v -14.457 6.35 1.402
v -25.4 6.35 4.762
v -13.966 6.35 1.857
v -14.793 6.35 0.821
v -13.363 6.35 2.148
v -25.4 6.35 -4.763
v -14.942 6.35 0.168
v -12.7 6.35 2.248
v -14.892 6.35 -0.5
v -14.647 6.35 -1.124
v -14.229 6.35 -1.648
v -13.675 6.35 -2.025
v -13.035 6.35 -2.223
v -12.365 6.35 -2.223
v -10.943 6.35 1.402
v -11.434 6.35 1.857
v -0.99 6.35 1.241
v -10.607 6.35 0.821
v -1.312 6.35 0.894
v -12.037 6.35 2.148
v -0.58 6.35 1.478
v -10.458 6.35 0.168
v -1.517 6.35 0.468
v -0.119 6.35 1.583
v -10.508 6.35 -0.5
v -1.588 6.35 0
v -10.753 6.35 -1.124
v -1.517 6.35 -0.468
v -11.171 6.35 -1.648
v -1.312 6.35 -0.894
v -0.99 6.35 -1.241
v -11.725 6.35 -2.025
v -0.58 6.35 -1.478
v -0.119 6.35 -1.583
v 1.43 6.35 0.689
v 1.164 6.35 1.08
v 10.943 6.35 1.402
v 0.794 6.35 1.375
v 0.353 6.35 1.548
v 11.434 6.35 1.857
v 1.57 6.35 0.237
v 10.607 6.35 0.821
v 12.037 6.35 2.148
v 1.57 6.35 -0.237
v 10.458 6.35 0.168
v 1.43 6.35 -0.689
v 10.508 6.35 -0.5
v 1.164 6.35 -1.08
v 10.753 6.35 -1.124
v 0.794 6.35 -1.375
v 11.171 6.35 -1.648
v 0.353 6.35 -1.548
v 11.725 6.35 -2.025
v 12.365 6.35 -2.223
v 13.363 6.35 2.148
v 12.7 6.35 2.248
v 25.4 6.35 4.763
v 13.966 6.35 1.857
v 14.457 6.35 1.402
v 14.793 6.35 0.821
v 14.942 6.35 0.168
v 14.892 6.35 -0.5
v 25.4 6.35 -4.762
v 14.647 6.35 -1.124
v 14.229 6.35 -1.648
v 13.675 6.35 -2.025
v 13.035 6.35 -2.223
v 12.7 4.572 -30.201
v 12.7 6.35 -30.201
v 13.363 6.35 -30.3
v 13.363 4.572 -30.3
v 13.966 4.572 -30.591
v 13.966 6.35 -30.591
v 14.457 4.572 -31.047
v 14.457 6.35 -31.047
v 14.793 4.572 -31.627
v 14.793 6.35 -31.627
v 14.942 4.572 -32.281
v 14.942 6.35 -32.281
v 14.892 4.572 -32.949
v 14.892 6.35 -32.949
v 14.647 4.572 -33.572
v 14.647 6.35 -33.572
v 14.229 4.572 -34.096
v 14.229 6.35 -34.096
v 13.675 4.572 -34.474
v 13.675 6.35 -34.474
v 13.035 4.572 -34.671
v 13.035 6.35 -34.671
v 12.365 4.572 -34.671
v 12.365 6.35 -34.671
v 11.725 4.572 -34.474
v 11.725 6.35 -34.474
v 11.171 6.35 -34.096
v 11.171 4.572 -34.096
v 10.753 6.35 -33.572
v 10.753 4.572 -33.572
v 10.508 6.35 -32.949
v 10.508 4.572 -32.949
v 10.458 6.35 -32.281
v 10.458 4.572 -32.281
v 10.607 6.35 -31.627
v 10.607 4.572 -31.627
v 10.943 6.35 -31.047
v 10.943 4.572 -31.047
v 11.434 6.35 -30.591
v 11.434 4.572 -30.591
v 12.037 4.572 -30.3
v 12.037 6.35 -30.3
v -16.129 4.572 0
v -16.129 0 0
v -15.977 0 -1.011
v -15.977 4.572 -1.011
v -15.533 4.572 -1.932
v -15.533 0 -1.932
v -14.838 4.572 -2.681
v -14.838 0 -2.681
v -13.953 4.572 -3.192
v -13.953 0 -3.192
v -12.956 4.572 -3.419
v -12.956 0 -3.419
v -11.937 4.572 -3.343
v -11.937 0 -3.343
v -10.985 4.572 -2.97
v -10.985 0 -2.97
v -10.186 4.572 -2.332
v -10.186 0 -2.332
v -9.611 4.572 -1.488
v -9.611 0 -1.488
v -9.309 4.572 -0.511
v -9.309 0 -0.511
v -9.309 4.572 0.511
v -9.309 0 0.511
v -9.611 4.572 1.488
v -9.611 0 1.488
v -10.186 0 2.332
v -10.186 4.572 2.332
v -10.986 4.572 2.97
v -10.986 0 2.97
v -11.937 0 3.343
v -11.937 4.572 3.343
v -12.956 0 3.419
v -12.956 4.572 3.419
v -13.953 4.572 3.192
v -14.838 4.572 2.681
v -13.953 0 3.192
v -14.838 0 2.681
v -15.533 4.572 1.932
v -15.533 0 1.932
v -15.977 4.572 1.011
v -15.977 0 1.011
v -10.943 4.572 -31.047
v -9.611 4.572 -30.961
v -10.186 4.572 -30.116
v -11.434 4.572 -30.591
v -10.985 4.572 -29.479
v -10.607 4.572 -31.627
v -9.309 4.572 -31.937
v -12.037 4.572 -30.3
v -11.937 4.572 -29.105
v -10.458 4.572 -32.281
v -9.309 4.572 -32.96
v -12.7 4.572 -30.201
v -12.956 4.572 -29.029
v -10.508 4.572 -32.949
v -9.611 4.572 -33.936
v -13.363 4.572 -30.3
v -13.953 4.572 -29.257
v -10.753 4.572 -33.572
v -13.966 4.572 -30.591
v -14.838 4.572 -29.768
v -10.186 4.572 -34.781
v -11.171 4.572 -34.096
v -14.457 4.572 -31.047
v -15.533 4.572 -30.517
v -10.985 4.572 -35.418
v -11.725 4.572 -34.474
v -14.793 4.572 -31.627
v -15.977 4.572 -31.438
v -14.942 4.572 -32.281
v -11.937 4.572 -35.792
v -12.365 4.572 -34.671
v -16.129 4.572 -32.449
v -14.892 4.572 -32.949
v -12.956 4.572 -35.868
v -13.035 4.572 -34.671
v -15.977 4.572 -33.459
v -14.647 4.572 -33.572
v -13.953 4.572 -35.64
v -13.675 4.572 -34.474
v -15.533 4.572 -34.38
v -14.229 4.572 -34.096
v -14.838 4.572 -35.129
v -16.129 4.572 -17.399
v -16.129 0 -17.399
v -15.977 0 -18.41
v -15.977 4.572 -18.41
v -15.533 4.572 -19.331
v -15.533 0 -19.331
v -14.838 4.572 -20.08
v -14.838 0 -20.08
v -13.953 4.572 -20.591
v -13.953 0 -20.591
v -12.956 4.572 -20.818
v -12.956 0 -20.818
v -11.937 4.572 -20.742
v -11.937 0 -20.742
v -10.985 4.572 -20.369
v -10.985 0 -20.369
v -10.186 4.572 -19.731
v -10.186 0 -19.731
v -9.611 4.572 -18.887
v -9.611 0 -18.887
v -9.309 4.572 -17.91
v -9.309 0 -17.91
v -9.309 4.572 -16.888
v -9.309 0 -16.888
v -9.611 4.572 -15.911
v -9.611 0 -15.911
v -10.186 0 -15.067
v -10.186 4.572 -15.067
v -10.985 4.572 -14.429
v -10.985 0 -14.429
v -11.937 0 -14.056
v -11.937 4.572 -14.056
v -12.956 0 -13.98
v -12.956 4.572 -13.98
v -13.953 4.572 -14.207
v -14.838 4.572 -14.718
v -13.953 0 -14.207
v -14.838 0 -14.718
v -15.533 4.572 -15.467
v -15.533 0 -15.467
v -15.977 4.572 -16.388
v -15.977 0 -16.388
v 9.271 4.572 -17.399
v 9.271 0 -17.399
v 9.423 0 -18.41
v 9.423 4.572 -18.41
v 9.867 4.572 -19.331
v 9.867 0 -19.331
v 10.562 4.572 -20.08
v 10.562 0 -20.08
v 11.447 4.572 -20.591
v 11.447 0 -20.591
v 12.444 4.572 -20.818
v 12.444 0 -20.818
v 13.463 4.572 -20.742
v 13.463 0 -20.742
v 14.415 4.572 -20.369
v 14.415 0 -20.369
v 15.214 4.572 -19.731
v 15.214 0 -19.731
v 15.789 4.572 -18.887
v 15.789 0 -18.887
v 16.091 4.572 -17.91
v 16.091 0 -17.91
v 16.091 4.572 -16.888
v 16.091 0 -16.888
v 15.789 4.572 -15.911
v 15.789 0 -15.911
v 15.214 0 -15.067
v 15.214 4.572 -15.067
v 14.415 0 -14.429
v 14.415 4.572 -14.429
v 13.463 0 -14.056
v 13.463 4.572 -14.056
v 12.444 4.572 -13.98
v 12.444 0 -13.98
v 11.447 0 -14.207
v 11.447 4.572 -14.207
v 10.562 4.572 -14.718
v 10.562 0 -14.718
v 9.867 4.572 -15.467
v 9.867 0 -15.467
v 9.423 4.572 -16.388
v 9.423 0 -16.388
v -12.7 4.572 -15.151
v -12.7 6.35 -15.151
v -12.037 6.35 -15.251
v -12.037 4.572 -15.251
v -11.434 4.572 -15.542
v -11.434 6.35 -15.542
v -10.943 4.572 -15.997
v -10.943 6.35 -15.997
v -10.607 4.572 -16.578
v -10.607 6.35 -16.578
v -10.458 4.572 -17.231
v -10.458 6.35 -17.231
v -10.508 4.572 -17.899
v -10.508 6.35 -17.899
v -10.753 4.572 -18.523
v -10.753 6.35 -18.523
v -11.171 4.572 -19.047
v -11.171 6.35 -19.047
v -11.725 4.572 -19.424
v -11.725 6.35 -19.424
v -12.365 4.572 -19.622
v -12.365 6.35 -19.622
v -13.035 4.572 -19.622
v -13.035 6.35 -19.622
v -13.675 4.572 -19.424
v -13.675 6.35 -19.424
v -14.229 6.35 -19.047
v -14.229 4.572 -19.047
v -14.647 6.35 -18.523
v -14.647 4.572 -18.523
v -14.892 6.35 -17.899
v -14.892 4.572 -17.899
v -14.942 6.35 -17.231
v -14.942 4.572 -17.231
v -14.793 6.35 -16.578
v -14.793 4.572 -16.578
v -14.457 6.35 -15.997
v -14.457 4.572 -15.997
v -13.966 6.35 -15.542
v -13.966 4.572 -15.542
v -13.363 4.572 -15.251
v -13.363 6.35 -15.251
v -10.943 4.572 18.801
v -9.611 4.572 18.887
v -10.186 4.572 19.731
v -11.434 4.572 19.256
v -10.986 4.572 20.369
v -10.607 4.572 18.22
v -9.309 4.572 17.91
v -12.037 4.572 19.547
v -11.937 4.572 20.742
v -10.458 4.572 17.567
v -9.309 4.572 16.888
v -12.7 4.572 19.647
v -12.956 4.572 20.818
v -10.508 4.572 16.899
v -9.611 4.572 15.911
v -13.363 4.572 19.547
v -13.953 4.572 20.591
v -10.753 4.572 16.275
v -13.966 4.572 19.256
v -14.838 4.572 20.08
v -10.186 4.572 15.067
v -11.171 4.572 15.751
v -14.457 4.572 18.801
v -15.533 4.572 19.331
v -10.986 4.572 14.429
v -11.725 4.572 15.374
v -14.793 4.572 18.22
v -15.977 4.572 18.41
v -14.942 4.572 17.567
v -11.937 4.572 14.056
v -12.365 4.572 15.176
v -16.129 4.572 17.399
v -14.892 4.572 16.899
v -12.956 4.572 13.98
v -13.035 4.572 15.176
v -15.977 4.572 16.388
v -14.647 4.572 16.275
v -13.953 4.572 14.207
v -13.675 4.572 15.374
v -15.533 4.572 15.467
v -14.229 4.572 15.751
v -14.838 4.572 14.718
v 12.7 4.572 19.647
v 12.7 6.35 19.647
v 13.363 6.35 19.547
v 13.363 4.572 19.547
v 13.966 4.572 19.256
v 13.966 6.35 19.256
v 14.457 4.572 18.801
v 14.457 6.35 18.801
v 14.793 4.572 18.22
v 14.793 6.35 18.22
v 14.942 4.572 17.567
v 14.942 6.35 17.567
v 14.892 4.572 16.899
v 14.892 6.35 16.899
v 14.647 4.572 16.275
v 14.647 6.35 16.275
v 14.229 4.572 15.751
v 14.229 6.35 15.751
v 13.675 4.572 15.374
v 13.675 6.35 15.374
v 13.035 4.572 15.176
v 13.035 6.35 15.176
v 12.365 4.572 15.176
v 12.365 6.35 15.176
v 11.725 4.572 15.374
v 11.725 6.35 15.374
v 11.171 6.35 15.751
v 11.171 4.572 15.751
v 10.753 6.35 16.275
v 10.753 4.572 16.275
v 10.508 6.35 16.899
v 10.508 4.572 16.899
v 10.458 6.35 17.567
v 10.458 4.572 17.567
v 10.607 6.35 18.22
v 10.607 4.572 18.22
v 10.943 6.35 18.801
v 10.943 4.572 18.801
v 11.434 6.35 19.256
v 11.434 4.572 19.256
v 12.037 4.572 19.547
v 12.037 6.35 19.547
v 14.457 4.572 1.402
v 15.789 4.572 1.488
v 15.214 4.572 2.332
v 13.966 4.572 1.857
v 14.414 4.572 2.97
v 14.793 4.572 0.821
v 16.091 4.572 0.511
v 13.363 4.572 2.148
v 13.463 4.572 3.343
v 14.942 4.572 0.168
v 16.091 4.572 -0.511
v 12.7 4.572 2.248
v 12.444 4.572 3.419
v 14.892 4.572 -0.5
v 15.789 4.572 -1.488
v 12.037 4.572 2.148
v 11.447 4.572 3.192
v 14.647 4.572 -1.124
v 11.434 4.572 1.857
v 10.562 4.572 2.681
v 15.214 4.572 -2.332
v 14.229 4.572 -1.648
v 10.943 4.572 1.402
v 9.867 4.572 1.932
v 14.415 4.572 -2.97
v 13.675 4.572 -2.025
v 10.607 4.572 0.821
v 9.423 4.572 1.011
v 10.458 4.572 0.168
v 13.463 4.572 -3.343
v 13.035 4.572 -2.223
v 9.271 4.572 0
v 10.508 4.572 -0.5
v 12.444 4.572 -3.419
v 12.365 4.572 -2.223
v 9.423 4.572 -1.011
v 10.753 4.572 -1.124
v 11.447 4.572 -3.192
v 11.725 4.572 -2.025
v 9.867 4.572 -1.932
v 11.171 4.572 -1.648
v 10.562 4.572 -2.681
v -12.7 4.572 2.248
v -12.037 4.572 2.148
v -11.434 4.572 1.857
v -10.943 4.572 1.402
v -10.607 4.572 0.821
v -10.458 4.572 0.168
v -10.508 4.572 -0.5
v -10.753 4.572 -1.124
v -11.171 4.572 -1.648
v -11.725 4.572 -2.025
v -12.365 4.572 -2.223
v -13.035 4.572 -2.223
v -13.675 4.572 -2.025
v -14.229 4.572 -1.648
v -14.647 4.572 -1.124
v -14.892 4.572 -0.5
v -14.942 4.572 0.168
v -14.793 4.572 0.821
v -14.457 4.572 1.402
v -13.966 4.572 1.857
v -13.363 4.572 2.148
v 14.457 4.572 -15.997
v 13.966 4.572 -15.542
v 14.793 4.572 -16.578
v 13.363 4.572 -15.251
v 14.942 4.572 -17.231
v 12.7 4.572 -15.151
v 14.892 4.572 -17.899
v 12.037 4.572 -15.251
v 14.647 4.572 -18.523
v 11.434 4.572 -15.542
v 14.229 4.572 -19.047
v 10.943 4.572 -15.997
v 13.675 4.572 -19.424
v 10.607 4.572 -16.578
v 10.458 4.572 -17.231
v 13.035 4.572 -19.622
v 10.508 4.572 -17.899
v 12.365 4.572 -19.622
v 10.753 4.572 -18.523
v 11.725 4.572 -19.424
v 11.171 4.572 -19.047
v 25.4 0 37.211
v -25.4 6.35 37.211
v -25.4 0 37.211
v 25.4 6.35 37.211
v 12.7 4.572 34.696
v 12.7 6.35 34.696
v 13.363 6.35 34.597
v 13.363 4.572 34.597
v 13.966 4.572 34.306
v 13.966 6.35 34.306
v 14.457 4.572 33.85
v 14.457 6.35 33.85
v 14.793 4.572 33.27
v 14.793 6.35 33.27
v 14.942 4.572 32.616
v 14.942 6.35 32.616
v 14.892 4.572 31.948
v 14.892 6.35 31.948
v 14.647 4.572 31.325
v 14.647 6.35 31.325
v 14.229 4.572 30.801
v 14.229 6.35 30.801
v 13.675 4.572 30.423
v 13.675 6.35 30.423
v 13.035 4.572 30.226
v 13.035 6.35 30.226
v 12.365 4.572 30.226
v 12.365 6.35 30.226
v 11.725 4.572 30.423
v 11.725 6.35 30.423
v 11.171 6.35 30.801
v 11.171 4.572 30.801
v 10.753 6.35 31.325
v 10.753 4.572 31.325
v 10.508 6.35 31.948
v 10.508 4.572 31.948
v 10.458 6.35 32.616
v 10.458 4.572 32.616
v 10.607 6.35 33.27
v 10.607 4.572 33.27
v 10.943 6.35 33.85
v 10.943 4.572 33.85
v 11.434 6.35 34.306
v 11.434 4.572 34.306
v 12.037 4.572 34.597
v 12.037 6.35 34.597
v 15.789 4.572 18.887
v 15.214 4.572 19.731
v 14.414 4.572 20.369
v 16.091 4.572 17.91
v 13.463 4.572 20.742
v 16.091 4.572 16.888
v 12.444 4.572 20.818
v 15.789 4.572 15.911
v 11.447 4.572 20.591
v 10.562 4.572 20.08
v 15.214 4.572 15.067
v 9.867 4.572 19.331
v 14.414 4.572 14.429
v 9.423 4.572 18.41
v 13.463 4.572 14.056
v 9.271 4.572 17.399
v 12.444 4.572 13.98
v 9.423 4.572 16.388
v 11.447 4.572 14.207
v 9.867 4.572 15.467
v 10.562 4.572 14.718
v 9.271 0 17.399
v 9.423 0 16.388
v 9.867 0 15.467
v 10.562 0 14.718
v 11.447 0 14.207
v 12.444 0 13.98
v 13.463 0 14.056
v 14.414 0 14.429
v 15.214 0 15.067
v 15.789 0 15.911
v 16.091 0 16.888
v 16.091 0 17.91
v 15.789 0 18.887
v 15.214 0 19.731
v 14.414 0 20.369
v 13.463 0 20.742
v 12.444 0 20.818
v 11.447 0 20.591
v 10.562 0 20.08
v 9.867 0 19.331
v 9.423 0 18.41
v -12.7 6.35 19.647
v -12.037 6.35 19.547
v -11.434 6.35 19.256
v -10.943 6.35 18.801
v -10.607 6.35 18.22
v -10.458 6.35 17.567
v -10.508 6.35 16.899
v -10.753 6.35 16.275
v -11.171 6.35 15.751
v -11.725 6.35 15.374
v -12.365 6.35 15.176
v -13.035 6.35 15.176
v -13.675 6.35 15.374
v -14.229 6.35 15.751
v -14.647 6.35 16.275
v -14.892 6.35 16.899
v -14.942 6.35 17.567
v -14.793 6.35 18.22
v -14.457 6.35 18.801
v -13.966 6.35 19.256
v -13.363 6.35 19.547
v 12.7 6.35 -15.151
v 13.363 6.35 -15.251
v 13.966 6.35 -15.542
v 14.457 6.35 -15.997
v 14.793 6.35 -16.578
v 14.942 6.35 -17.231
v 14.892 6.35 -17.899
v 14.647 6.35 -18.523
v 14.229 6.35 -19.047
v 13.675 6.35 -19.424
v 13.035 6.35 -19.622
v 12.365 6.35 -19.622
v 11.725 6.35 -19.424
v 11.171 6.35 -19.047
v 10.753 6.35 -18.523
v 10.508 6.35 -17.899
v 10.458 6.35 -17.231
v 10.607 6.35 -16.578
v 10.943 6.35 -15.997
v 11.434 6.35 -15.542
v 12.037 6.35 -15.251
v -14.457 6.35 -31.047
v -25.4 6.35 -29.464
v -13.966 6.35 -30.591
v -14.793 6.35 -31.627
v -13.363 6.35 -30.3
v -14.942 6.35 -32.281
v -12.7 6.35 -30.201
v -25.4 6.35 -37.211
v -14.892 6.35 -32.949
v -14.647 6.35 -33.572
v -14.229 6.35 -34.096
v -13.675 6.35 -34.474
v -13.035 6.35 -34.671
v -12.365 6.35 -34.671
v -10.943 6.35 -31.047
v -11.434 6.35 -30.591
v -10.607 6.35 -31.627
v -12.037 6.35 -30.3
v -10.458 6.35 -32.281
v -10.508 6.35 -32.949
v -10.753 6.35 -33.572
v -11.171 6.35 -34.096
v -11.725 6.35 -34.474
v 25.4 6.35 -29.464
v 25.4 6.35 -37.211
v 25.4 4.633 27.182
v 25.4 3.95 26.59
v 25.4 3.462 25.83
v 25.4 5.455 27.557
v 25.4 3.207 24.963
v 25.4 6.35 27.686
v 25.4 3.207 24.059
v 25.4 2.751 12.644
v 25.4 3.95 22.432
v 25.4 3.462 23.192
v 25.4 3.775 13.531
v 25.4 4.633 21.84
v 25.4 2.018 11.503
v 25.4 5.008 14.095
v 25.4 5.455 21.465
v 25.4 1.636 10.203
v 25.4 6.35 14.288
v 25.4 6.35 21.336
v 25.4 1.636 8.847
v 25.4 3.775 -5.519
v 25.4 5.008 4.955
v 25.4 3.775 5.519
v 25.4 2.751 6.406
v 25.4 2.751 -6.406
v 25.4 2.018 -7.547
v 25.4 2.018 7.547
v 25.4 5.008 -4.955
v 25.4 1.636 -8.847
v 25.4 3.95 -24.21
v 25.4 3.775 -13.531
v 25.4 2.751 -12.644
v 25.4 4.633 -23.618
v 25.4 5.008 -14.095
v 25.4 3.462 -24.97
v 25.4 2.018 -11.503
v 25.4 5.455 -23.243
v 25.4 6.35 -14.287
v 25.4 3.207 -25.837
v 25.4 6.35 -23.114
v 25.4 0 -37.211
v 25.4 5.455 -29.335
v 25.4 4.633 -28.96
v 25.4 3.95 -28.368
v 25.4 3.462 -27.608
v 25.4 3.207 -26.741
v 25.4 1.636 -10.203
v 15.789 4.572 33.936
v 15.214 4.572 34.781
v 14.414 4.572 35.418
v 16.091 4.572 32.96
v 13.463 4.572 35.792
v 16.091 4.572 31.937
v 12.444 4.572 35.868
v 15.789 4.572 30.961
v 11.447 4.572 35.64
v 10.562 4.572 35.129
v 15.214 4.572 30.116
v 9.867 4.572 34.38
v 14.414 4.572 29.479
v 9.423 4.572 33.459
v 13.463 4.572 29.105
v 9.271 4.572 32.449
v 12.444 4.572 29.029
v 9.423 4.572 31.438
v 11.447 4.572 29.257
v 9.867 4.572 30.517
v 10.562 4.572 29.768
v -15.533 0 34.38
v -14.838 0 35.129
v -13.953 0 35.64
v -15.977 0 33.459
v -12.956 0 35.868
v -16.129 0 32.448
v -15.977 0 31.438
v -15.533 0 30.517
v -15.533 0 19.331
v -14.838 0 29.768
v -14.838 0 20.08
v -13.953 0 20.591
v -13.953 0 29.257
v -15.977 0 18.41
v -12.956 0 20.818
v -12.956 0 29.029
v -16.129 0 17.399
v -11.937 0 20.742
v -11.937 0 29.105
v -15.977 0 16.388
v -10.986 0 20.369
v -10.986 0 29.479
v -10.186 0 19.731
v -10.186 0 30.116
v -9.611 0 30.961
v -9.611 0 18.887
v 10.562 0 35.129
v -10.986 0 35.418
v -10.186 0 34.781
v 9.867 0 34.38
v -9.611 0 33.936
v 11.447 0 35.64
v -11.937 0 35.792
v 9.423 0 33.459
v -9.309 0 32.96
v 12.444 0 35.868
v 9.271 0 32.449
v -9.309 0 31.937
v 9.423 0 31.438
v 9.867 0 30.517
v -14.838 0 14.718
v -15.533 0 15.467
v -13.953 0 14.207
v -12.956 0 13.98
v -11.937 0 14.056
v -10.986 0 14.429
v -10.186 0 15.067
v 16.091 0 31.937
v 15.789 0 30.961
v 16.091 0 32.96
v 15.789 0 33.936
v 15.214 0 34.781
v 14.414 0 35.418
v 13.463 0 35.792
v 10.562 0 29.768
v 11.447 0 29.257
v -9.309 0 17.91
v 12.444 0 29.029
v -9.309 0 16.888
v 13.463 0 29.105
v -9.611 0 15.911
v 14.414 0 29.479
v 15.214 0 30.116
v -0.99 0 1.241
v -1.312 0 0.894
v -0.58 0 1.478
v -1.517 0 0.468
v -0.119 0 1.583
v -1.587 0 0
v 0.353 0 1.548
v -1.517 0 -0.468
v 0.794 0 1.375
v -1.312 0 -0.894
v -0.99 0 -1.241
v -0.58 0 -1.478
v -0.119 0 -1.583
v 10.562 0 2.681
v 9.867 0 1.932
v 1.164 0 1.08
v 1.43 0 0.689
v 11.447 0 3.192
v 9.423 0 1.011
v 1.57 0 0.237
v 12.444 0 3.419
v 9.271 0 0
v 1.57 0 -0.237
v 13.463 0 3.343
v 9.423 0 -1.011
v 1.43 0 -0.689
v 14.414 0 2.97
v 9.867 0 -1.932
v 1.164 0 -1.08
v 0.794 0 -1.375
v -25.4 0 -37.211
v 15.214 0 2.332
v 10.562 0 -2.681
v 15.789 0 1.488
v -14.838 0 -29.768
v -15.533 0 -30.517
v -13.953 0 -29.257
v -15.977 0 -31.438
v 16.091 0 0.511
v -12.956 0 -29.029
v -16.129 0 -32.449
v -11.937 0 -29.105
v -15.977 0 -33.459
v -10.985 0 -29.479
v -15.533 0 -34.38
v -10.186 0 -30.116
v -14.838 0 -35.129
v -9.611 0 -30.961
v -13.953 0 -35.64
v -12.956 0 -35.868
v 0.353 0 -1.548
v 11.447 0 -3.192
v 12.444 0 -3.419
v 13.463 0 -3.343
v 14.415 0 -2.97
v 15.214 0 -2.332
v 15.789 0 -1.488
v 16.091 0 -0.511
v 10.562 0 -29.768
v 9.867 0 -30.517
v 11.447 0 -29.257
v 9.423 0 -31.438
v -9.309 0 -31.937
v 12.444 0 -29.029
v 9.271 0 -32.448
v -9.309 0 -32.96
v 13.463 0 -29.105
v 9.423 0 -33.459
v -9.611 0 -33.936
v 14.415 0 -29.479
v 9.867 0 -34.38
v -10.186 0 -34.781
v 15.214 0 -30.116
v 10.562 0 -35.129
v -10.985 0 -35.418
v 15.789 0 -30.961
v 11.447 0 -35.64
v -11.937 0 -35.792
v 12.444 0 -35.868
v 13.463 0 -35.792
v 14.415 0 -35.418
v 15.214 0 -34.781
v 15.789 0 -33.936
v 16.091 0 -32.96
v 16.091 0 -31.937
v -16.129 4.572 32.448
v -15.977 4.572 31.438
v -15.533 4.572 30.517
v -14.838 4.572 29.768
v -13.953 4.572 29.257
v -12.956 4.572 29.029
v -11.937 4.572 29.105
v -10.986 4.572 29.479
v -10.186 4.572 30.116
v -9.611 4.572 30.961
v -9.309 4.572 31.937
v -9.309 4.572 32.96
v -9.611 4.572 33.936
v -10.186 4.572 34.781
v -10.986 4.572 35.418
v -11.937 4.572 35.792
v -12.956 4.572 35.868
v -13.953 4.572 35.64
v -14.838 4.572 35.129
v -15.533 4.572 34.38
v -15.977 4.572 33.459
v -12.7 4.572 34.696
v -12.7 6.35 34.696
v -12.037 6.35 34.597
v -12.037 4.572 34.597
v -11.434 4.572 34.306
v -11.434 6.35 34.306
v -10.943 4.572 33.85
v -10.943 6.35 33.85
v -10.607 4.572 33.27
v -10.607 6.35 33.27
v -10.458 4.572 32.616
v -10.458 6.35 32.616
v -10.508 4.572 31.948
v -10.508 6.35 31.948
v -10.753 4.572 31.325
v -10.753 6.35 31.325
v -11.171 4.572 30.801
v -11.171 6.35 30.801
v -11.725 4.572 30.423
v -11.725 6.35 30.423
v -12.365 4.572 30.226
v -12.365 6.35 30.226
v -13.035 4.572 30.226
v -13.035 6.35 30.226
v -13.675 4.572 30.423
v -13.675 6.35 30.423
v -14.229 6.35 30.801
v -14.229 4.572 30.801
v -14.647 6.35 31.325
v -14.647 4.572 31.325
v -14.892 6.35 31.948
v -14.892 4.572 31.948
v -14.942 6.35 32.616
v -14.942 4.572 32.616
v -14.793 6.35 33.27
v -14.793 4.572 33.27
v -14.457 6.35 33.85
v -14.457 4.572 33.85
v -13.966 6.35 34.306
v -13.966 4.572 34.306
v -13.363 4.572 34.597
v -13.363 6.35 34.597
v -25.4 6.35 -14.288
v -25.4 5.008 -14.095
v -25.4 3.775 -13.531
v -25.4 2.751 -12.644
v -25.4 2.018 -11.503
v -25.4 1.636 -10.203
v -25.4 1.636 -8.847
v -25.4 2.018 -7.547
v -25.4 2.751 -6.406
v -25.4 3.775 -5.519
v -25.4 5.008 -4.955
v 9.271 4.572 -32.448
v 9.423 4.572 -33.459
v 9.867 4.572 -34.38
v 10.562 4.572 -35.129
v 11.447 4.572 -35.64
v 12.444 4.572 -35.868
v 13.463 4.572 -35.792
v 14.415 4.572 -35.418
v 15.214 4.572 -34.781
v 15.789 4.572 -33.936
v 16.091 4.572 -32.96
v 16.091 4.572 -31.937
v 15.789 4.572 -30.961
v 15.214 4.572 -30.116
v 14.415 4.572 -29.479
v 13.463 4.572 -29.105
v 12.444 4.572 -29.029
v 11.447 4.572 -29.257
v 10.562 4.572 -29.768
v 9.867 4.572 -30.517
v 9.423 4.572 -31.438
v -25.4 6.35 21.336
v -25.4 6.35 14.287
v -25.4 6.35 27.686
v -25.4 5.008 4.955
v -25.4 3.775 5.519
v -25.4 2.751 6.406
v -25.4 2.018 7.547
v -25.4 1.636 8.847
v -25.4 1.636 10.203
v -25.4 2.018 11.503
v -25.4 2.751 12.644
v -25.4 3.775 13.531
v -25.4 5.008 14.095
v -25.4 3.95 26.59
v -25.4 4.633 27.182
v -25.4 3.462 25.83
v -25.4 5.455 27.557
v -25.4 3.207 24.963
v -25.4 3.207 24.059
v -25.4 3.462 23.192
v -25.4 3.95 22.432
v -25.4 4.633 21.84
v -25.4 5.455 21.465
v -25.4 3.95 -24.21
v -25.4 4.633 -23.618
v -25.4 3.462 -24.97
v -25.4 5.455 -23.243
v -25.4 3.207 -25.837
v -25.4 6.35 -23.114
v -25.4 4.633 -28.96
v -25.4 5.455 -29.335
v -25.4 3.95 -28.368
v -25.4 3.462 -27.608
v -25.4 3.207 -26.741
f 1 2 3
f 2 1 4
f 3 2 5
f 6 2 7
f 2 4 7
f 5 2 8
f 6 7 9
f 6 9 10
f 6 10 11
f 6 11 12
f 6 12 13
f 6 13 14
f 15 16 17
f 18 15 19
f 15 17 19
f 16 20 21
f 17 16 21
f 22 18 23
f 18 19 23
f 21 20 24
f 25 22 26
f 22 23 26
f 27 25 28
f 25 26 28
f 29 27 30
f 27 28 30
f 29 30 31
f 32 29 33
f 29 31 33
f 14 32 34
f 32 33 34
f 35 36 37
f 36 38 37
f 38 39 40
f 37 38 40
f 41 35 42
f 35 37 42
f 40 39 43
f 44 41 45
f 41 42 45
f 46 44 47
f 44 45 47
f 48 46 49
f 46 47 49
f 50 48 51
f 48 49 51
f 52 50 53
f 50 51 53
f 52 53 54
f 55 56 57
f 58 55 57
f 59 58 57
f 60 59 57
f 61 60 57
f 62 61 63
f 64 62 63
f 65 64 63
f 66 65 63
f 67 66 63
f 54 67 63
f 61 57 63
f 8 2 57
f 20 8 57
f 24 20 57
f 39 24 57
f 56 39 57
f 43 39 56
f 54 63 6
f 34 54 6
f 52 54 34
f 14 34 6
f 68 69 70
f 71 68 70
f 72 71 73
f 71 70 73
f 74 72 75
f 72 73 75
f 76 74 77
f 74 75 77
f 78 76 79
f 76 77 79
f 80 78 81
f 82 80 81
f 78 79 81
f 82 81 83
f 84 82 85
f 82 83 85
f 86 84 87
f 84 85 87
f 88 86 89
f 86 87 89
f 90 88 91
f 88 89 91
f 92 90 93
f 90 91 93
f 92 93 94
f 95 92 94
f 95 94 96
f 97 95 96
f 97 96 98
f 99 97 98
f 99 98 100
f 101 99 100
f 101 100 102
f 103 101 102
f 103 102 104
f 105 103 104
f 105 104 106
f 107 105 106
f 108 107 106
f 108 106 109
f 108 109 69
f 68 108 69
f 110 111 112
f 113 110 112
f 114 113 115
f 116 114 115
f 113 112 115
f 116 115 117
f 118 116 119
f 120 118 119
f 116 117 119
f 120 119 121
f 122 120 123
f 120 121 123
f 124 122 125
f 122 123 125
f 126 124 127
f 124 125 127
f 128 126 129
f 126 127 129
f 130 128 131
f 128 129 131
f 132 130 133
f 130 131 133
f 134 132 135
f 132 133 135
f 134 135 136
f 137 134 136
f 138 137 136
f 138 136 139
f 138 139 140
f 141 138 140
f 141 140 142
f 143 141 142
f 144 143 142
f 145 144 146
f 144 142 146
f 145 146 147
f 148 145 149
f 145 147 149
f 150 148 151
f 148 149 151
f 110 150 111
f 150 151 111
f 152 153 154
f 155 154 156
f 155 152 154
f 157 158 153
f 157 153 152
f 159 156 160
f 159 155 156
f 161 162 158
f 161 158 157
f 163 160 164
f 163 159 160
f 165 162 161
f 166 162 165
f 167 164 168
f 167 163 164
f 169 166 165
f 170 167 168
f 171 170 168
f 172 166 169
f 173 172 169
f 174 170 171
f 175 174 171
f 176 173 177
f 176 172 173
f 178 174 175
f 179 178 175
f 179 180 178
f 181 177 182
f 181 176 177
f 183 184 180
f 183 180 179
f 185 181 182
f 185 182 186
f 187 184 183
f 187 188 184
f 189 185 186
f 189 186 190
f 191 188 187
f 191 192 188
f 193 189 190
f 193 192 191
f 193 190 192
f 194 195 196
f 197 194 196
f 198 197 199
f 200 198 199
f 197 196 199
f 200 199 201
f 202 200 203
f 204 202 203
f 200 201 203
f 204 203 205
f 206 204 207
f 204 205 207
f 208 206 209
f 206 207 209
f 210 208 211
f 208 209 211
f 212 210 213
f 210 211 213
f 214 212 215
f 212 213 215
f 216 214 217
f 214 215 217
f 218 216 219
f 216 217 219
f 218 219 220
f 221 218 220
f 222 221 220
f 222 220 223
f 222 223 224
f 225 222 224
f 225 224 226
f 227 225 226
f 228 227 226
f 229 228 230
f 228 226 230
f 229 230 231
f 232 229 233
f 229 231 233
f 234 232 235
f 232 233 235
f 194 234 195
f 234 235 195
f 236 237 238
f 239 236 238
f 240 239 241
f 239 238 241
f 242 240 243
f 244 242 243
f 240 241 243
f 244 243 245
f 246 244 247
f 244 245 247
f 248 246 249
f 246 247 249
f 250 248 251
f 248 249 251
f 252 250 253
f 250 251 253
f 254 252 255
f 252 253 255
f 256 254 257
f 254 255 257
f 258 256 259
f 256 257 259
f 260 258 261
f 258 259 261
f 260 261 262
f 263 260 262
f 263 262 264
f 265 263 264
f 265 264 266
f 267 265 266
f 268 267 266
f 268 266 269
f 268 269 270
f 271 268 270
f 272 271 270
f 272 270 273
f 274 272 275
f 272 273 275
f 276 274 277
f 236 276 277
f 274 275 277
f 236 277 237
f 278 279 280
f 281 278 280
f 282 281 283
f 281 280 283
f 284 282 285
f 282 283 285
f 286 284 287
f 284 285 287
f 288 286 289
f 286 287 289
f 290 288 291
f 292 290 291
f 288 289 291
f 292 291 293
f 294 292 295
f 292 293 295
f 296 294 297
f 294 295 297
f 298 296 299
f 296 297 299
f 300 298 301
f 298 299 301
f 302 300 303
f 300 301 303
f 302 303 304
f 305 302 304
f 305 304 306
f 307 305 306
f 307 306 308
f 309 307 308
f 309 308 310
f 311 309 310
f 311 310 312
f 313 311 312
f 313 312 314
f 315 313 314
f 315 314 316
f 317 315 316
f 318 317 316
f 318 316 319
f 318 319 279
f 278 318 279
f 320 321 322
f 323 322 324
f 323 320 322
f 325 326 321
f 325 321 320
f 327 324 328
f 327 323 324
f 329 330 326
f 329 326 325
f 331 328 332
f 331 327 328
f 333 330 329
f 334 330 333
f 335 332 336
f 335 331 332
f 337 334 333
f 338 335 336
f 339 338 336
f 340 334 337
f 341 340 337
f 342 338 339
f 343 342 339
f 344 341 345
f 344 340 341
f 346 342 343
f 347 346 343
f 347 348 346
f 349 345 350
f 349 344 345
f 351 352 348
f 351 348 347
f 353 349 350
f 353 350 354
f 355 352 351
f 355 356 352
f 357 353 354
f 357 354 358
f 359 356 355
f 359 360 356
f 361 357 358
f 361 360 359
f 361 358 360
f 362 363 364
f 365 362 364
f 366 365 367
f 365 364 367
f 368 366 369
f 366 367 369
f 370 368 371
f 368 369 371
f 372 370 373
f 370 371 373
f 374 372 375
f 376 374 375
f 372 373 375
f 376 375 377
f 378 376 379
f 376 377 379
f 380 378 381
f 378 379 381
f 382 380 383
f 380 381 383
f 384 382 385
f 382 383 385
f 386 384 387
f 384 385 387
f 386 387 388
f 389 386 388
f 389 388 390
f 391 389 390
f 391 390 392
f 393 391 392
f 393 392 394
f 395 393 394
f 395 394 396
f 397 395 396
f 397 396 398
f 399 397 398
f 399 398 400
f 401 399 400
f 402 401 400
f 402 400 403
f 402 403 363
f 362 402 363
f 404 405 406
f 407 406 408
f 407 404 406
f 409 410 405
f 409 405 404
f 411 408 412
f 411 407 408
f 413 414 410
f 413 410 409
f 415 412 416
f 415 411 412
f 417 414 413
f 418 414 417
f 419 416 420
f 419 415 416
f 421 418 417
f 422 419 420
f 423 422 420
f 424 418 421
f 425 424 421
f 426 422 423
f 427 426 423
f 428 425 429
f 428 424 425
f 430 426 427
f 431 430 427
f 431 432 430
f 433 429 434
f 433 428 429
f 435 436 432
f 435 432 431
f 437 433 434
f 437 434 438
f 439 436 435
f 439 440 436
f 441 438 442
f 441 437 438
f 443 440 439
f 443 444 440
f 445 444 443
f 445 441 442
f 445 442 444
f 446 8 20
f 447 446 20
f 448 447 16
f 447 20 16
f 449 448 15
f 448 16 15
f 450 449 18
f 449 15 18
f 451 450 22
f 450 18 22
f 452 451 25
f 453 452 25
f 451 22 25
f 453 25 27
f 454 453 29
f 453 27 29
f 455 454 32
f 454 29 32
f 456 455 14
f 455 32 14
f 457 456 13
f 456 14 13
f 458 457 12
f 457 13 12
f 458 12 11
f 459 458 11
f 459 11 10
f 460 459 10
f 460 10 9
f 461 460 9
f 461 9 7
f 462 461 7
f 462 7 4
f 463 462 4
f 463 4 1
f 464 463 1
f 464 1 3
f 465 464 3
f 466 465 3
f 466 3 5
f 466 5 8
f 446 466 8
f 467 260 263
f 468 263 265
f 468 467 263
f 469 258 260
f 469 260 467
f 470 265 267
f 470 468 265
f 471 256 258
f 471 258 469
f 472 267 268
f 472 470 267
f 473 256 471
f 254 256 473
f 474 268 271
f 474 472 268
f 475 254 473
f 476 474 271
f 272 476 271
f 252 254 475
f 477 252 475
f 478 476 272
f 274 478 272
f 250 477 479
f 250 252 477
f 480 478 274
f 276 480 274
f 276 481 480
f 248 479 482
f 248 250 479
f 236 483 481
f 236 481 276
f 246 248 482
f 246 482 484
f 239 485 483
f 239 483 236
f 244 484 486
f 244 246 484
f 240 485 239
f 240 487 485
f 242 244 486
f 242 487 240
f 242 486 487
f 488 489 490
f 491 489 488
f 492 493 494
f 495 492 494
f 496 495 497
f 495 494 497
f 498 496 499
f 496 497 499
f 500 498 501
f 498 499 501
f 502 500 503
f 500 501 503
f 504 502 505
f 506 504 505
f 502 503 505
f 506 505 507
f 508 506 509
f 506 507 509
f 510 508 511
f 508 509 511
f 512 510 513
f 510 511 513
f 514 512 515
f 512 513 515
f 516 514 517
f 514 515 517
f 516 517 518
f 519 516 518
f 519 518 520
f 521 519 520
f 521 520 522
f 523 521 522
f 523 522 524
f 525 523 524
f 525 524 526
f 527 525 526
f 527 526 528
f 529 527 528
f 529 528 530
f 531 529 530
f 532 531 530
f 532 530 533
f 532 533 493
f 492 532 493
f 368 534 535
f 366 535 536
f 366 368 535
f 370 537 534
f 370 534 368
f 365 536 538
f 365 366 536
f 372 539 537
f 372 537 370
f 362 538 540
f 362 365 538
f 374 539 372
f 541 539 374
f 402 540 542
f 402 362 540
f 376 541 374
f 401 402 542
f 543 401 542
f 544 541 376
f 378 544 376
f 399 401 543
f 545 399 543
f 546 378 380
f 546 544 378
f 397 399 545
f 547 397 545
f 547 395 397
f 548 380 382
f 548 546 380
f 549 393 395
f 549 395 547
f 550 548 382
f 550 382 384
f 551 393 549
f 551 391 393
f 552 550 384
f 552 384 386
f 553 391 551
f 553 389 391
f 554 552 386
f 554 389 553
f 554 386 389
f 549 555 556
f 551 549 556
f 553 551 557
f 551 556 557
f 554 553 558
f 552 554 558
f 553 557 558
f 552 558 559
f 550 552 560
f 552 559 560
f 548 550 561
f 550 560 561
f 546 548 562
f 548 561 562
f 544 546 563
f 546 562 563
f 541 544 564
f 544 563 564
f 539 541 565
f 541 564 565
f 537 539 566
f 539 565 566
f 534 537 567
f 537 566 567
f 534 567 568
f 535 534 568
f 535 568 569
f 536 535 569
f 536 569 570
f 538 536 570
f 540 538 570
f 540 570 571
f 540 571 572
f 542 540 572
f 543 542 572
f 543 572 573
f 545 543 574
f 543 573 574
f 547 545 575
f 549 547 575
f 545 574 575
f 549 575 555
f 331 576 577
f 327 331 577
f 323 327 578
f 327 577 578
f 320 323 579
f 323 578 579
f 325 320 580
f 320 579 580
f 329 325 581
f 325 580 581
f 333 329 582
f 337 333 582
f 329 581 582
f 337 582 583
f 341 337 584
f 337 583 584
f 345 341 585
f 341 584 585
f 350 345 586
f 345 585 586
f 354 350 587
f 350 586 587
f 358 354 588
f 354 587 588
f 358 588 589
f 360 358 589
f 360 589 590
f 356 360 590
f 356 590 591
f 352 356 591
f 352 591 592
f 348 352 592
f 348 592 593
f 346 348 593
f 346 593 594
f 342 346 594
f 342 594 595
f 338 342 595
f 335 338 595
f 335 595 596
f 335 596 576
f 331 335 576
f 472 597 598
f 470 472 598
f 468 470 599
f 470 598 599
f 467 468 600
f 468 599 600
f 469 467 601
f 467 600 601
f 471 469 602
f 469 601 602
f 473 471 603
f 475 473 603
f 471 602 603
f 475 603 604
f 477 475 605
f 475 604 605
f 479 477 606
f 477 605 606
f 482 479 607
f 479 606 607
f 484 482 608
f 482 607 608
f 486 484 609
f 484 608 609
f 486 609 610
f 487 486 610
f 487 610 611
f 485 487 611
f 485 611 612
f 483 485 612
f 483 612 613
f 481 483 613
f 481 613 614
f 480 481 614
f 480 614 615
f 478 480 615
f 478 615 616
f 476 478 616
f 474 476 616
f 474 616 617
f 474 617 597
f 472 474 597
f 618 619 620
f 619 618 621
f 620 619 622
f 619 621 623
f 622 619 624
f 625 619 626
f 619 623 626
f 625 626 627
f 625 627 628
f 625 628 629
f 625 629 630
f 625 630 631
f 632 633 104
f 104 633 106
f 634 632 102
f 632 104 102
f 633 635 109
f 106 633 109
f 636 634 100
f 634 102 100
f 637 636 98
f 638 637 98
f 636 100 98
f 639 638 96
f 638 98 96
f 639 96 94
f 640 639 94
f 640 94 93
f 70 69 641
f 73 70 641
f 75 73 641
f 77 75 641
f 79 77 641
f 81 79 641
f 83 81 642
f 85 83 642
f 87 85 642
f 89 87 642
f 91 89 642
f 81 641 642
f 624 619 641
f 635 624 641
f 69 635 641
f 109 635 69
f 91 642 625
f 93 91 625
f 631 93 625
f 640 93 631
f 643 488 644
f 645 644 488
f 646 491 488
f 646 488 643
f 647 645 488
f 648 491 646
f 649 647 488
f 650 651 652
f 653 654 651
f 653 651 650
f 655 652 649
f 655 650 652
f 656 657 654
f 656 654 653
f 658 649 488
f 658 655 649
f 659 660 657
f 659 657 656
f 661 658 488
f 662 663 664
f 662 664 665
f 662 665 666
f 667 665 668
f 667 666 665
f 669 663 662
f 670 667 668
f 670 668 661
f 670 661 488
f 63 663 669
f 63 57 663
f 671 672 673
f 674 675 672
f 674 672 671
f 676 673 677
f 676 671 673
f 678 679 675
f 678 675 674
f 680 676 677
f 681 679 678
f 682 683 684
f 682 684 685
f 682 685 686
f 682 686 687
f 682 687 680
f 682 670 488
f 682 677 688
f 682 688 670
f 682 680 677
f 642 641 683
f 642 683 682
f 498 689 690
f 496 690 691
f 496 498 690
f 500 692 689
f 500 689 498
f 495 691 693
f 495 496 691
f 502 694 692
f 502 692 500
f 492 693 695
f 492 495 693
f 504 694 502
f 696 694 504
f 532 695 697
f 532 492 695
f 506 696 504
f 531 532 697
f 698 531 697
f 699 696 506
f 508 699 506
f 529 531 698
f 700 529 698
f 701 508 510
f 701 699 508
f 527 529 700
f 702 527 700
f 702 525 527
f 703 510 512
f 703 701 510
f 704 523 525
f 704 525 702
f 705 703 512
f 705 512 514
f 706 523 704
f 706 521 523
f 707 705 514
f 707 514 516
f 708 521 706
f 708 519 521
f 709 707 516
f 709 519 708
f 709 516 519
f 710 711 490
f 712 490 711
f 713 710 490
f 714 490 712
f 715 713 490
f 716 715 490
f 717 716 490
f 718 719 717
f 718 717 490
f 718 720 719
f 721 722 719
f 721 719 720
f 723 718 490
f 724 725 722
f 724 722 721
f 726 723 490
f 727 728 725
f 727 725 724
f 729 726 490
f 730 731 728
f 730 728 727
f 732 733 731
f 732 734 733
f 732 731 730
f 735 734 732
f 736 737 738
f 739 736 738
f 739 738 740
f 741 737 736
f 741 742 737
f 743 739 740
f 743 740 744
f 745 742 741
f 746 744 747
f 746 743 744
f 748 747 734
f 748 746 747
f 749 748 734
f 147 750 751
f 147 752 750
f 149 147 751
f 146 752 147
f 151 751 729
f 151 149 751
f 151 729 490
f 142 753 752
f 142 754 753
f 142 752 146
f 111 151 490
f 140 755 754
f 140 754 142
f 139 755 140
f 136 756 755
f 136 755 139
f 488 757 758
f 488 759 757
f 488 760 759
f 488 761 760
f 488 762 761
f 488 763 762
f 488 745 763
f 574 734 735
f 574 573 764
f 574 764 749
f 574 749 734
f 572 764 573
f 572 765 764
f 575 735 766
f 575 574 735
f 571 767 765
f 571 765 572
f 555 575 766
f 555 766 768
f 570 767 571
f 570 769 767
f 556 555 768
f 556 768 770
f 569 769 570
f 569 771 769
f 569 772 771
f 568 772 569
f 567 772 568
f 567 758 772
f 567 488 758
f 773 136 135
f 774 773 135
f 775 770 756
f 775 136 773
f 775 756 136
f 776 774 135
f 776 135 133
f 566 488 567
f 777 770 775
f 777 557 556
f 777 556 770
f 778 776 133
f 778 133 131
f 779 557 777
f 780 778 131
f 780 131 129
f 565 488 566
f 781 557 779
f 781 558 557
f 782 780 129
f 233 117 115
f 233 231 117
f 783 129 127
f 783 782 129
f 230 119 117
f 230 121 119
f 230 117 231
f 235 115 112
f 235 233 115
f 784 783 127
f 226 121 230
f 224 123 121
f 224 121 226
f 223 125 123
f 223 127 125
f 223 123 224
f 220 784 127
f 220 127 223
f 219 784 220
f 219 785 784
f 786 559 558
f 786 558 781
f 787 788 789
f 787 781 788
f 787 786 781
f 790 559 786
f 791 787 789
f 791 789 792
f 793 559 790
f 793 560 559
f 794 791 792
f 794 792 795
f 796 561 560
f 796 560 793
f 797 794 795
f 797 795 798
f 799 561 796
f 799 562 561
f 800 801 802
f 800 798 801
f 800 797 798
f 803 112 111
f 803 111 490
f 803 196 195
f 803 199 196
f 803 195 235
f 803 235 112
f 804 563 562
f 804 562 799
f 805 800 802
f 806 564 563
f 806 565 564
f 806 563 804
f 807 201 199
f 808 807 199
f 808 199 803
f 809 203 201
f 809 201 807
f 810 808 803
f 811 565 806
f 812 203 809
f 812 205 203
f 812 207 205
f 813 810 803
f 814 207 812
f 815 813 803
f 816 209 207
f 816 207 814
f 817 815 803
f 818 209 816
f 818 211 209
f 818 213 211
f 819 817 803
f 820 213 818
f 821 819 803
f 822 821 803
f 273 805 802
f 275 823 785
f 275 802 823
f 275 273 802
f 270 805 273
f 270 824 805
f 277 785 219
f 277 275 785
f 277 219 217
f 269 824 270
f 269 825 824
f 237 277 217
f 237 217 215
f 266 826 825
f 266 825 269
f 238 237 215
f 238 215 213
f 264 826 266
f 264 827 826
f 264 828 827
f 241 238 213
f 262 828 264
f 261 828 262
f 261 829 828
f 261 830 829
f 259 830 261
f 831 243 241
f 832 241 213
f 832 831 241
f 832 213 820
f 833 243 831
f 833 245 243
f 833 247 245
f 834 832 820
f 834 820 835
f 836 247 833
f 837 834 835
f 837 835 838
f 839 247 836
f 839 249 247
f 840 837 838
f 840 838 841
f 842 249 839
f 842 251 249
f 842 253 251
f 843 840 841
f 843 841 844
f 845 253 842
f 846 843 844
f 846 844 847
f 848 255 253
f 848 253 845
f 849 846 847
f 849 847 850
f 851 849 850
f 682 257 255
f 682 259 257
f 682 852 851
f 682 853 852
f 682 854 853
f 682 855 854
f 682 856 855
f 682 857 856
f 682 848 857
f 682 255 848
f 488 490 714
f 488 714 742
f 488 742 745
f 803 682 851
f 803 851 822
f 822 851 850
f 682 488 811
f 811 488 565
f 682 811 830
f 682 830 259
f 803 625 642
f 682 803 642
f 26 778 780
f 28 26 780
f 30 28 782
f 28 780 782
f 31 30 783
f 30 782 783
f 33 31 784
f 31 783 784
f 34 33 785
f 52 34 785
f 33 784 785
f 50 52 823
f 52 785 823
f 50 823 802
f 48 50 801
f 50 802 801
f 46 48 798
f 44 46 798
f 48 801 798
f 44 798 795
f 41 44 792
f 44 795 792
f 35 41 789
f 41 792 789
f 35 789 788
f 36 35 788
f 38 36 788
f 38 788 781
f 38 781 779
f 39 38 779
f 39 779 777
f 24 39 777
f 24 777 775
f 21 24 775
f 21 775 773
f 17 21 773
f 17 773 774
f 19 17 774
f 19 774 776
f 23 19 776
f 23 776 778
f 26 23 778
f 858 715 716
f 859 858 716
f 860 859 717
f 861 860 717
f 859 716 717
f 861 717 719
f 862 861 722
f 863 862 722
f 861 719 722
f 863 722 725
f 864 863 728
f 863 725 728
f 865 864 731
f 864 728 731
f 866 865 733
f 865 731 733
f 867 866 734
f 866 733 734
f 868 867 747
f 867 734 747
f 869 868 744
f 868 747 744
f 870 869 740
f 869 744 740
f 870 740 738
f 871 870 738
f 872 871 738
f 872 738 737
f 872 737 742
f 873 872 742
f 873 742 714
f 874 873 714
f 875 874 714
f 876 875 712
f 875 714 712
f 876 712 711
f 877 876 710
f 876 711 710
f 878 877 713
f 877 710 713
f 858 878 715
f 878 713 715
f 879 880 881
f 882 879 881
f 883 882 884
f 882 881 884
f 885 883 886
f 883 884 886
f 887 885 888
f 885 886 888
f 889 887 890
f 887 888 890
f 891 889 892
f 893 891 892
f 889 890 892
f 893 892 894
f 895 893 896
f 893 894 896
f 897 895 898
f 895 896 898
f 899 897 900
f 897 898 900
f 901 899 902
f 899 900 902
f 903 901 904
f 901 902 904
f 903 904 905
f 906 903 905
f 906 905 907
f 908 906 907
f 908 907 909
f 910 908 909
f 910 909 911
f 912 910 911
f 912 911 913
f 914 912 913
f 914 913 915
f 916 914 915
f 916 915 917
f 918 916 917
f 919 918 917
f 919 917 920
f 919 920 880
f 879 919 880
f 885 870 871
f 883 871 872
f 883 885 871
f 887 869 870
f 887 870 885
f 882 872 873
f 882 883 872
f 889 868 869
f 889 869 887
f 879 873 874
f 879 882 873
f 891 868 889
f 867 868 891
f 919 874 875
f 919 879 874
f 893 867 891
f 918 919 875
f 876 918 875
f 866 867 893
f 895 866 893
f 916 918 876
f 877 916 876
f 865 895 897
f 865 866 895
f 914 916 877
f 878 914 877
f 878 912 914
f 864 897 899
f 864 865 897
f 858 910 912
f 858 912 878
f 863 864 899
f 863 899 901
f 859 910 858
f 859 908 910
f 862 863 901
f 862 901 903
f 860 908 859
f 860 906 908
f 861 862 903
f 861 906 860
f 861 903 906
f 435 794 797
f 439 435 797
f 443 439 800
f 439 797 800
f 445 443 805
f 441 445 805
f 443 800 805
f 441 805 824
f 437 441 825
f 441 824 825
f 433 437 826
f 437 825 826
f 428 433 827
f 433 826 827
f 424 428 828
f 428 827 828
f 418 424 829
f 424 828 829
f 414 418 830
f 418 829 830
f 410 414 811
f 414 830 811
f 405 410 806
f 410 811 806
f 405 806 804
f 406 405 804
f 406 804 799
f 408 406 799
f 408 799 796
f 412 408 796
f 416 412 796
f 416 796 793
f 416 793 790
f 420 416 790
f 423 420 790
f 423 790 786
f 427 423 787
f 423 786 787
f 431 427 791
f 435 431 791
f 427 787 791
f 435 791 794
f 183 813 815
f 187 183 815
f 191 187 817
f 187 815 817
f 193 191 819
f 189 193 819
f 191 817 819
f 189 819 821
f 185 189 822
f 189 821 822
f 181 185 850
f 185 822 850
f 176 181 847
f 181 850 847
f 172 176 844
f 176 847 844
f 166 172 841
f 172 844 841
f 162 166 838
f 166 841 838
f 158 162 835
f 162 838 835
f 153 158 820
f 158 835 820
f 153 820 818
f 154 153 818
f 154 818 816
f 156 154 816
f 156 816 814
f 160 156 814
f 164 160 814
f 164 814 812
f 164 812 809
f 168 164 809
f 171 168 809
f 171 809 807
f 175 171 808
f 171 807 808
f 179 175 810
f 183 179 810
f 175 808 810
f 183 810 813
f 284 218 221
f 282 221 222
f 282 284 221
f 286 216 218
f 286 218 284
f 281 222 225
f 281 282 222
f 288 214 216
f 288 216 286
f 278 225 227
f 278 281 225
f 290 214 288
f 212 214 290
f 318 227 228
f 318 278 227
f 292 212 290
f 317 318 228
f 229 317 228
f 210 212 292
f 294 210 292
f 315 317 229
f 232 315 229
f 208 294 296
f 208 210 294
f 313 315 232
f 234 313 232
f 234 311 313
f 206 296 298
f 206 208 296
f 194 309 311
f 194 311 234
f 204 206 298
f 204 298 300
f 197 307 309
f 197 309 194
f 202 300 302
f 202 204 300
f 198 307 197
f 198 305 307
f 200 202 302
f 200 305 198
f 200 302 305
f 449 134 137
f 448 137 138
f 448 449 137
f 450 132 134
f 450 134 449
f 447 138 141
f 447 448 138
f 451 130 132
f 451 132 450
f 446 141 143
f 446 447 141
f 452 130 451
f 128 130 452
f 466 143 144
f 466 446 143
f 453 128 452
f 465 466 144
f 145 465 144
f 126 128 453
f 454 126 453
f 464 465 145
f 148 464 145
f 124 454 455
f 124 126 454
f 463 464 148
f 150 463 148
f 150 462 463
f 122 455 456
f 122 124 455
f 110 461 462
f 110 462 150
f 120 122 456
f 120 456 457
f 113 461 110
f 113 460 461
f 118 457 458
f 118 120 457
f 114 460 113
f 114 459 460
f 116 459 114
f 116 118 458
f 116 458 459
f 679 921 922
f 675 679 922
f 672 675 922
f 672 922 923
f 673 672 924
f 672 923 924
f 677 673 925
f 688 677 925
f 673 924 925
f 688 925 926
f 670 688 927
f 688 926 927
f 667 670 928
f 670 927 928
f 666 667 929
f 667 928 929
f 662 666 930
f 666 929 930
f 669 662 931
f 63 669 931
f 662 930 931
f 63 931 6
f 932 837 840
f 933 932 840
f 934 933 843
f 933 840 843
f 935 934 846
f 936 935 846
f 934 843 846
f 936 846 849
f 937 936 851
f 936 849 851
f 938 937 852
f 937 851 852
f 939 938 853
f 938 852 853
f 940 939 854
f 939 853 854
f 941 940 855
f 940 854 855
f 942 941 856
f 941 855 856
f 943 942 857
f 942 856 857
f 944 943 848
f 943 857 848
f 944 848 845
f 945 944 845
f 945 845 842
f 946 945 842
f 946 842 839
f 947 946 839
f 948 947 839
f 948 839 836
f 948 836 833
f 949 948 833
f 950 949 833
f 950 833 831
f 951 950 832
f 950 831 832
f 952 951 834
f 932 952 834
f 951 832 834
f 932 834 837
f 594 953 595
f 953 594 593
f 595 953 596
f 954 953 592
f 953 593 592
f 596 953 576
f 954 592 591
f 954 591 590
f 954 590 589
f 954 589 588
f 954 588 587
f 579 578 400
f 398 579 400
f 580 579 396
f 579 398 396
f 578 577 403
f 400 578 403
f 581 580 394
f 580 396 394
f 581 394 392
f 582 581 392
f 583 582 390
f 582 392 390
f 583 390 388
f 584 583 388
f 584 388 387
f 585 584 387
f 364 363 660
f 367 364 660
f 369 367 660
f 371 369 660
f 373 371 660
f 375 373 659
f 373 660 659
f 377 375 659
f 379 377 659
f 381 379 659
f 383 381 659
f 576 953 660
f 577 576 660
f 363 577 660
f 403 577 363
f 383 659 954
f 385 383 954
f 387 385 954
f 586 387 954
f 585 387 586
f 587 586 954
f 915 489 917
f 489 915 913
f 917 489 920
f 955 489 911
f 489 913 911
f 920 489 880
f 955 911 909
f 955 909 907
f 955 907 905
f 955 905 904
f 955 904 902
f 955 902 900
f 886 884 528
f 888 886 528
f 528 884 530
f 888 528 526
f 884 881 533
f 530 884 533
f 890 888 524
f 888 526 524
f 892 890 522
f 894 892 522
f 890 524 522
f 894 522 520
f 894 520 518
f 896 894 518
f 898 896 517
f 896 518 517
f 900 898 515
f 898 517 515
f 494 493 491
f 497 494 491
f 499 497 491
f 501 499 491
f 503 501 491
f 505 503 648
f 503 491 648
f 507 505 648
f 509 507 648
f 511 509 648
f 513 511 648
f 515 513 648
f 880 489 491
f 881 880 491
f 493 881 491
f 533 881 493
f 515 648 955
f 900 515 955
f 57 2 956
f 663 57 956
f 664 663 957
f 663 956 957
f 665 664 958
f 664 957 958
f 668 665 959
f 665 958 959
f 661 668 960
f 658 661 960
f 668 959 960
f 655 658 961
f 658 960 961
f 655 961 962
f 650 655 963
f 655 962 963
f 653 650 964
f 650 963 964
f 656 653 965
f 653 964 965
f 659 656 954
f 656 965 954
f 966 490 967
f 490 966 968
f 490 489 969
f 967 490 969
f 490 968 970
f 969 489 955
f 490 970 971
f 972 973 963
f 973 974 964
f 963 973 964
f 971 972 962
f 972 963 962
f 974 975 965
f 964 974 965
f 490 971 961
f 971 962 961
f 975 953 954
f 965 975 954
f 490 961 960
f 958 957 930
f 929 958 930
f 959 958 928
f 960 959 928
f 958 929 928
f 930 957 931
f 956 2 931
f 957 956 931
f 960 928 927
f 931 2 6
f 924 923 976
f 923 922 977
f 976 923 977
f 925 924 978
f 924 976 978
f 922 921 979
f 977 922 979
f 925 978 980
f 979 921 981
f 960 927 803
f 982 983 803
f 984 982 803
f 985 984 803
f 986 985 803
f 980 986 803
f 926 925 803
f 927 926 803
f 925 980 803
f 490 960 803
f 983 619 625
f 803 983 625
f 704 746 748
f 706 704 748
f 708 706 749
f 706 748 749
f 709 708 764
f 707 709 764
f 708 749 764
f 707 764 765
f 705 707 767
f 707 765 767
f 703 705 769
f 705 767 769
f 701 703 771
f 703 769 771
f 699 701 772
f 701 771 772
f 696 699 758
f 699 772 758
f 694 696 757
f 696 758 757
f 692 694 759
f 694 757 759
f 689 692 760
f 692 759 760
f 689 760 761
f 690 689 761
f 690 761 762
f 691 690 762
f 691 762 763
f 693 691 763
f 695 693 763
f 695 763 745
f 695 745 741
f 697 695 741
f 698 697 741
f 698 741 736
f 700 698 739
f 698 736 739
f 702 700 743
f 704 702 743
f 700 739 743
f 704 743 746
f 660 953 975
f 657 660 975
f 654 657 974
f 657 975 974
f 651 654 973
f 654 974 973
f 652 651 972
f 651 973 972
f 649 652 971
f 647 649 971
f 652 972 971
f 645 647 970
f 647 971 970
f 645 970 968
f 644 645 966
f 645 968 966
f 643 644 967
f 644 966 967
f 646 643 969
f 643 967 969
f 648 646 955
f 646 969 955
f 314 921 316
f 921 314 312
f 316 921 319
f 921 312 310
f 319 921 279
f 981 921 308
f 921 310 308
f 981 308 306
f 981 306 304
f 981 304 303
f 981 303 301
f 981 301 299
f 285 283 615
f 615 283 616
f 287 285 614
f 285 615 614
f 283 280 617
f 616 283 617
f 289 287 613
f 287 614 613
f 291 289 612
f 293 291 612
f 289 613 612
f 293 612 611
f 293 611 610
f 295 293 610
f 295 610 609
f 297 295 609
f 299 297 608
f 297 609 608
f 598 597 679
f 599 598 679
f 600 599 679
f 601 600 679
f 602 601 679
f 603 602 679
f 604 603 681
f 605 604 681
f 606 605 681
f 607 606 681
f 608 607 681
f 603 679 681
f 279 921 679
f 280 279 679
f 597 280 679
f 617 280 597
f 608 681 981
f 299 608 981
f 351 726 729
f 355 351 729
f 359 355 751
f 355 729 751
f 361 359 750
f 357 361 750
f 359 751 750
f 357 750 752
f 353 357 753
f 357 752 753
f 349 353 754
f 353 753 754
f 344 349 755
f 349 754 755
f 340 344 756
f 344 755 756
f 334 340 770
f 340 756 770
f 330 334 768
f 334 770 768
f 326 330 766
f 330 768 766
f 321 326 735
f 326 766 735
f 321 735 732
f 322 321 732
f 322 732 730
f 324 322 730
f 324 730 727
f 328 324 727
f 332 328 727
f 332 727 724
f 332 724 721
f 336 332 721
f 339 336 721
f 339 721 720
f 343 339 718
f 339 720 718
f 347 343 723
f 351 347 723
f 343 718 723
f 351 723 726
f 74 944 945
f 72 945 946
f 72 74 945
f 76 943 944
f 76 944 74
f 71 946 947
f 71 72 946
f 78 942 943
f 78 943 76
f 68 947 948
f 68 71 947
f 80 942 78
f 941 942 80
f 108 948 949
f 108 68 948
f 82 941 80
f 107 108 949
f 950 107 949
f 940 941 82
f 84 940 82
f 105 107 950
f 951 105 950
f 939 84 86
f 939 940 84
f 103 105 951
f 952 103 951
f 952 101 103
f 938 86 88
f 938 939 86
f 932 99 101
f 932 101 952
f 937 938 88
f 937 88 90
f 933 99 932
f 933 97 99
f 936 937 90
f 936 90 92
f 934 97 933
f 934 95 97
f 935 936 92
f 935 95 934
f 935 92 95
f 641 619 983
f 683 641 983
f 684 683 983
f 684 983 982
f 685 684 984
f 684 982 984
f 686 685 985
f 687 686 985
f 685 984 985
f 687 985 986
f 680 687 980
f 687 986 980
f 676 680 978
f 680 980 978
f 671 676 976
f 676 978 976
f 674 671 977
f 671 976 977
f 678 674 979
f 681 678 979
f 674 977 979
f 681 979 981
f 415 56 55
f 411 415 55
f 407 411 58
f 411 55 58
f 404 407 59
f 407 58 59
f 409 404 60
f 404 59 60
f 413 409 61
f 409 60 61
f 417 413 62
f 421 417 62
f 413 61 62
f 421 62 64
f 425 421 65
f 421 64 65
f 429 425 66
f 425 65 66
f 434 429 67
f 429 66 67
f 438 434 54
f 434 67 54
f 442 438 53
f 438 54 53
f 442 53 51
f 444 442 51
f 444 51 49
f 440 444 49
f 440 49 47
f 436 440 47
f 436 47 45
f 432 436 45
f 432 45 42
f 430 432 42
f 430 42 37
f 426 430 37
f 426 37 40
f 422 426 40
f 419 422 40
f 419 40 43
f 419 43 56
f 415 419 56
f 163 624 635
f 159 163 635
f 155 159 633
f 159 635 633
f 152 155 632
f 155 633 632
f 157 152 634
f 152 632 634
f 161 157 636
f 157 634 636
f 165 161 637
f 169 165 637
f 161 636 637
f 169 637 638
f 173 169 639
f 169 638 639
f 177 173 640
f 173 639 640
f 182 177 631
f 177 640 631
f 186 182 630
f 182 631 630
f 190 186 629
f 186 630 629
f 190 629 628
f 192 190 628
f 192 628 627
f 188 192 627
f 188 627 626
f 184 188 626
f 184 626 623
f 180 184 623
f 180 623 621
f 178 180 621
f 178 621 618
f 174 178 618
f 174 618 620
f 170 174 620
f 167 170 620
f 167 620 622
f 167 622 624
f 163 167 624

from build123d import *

# Parameters (mm, degrees)
SKETCH1_W             = 74.422
SKETCH1_H             = 50.8
BOSS_EXTRUDE1_DEPTH   = 6.35
SKETCH2_R             = 3.175
CUT_EXTRUDE1_DEPTH    = 64.289975675
SKETCH3_R             = 4.7625
CUT_EXTRUDE2_DEPTH    = 64.289975675
F_8_CLEARANCE_HOLE1_D = 4.4958
SKETCH6_R             = 3.429
CUT_EXTRUDE3_DEPTH    = 4.572
SKETCH7_R             = 1.5875
CUT_EXTRUDE4_DEPTH    = 46.498802413
BODY_MOVE_COPY3_ANGLE = 180


with BuildPart() as part:
    # Sketch1 → Boss-Extrude1 (new body)
    with BuildSketch(Plane(origin=(0, 0, 0), x_dir=(1, 0, 0), z_dir=(0, 1, 0))):
        Rectangle(SKETCH1_W, SKETCH1_H)
    extrude(amount=BOSS_EXTRUDE1_DEPTH)

    # Sketch2 → Cut-Extrude1 (cut, through all)
    with BuildSketch(Plane.XY.offset(25.4)):
        with Locations((-24.511, 0)):
            Circle(SKETCH2_R)
        with Locations((26.289, 0)):
            Circle(SKETCH2_R)
    extrude(amount=-CUT_EXTRUDE1_DEPTH, mode=Mode.SUBTRACT)

    # Sketch3 → Cut-Extrude2 (cut, through all)
    with BuildSketch(Plane.XY.offset(25.4)):
        with Locations((-9.525, 0)):
            Circle(SKETCH3_R)
        with Locations((9.525, 0)):
            Circle(SKETCH3_R)
    extrude(amount=-CUT_EXTRUDE2_DEPTH, mode=Mode.SUBTRACT)

    # #8 Clearance Hole1 (through all)
    with Locations(Plane(origin=(0, 6.35, 0), x_dir=(1, 0, 0), z_dir=(0, 1, 0))):
        with Locations((-32.4485, 12.7), (-32.4485, -12.7), (-17.399, -12.7), (0, -12.7), (17.399, -12.7), (32.4485, -12.7), (32.4485, 12.7), (17.399, 12.7), (0, 12.7), (-17.399, 12.7)):
            Hole(F_8_CLEARANCE_HOLE1_D / 2)

    # Sketch6 → Cut-Extrude3 (cut)
    with BuildSketch(Plane(origin=(0, 6.35, 0), x_dir=(1, 0, 0), z_dir=(0, 1, 0))):
        with Locations(Location((-32.4485, 12.7, 0), (0, 0, 270))):
            Circle(SKETCH6_R)
        with Locations(Location((-17.399, 12.7, 0), (0, 0, 270))):
            Circle(SKETCH6_R)
        with Locations(Location((0, 12.7, 0), (0, 0, 270))):
            Circle(SKETCH6_R)
        with Locations(Location((17.399, 12.7, 0), (0, 0, 270))):
            Circle(SKETCH6_R)
        with Locations(Location((32.4485, 12.7, 0), (0, 0, 270))):
            Circle(SKETCH6_R)
        with Locations(Location((32.4485, -12.7, 0), (0, 0, 270))):
            Circle(SKETCH6_R)
        with Locations(Location((17.399, -12.7, 0), (0, 0, 270))):
            Circle(SKETCH6_R)
        with Locations(Location((0, -12.7, 0), (0, 0, 270))):
            Circle(SKETCH6_R)
        with Locations(Location((-17.399, -12.7, 0), (0, 0, 270))):
            Circle(SKETCH6_R)
        with Locations(Location((-32.4485, -12.7, 0), (0, 0, 270))):
            Circle(SKETCH6_R)
    extrude(amount=-CUT_EXTRUDE3_DEPTH, mode=Mode.SUBTRACT)

    # Sketch7 → Cut-Extrude4 (cut, through all)
    with BuildSketch(Plane(origin=(0, 6.35, 0), x_dir=(1, 0, 0), z_dir=(0, 1, 0))):
        with Locations(Location((0, 0, 0), (0, 0, 270))):
            Circle(SKETCH7_R)
    extrude(amount=-CUT_EXTRUDE4_DEPTH, mode=Mode.SUBTRACT)


with BuildPart() as part_1:
    # Body-Move/Copy3: moved
    add(part.part.moved(Location((0, 0, 0))).rotate(Axis((0, 3.175, 0), (0.7071067811865488, 0, -0.7071067811865462)), BODY_MOVE_COPY3_ANGLE))


solid = part_1.part
